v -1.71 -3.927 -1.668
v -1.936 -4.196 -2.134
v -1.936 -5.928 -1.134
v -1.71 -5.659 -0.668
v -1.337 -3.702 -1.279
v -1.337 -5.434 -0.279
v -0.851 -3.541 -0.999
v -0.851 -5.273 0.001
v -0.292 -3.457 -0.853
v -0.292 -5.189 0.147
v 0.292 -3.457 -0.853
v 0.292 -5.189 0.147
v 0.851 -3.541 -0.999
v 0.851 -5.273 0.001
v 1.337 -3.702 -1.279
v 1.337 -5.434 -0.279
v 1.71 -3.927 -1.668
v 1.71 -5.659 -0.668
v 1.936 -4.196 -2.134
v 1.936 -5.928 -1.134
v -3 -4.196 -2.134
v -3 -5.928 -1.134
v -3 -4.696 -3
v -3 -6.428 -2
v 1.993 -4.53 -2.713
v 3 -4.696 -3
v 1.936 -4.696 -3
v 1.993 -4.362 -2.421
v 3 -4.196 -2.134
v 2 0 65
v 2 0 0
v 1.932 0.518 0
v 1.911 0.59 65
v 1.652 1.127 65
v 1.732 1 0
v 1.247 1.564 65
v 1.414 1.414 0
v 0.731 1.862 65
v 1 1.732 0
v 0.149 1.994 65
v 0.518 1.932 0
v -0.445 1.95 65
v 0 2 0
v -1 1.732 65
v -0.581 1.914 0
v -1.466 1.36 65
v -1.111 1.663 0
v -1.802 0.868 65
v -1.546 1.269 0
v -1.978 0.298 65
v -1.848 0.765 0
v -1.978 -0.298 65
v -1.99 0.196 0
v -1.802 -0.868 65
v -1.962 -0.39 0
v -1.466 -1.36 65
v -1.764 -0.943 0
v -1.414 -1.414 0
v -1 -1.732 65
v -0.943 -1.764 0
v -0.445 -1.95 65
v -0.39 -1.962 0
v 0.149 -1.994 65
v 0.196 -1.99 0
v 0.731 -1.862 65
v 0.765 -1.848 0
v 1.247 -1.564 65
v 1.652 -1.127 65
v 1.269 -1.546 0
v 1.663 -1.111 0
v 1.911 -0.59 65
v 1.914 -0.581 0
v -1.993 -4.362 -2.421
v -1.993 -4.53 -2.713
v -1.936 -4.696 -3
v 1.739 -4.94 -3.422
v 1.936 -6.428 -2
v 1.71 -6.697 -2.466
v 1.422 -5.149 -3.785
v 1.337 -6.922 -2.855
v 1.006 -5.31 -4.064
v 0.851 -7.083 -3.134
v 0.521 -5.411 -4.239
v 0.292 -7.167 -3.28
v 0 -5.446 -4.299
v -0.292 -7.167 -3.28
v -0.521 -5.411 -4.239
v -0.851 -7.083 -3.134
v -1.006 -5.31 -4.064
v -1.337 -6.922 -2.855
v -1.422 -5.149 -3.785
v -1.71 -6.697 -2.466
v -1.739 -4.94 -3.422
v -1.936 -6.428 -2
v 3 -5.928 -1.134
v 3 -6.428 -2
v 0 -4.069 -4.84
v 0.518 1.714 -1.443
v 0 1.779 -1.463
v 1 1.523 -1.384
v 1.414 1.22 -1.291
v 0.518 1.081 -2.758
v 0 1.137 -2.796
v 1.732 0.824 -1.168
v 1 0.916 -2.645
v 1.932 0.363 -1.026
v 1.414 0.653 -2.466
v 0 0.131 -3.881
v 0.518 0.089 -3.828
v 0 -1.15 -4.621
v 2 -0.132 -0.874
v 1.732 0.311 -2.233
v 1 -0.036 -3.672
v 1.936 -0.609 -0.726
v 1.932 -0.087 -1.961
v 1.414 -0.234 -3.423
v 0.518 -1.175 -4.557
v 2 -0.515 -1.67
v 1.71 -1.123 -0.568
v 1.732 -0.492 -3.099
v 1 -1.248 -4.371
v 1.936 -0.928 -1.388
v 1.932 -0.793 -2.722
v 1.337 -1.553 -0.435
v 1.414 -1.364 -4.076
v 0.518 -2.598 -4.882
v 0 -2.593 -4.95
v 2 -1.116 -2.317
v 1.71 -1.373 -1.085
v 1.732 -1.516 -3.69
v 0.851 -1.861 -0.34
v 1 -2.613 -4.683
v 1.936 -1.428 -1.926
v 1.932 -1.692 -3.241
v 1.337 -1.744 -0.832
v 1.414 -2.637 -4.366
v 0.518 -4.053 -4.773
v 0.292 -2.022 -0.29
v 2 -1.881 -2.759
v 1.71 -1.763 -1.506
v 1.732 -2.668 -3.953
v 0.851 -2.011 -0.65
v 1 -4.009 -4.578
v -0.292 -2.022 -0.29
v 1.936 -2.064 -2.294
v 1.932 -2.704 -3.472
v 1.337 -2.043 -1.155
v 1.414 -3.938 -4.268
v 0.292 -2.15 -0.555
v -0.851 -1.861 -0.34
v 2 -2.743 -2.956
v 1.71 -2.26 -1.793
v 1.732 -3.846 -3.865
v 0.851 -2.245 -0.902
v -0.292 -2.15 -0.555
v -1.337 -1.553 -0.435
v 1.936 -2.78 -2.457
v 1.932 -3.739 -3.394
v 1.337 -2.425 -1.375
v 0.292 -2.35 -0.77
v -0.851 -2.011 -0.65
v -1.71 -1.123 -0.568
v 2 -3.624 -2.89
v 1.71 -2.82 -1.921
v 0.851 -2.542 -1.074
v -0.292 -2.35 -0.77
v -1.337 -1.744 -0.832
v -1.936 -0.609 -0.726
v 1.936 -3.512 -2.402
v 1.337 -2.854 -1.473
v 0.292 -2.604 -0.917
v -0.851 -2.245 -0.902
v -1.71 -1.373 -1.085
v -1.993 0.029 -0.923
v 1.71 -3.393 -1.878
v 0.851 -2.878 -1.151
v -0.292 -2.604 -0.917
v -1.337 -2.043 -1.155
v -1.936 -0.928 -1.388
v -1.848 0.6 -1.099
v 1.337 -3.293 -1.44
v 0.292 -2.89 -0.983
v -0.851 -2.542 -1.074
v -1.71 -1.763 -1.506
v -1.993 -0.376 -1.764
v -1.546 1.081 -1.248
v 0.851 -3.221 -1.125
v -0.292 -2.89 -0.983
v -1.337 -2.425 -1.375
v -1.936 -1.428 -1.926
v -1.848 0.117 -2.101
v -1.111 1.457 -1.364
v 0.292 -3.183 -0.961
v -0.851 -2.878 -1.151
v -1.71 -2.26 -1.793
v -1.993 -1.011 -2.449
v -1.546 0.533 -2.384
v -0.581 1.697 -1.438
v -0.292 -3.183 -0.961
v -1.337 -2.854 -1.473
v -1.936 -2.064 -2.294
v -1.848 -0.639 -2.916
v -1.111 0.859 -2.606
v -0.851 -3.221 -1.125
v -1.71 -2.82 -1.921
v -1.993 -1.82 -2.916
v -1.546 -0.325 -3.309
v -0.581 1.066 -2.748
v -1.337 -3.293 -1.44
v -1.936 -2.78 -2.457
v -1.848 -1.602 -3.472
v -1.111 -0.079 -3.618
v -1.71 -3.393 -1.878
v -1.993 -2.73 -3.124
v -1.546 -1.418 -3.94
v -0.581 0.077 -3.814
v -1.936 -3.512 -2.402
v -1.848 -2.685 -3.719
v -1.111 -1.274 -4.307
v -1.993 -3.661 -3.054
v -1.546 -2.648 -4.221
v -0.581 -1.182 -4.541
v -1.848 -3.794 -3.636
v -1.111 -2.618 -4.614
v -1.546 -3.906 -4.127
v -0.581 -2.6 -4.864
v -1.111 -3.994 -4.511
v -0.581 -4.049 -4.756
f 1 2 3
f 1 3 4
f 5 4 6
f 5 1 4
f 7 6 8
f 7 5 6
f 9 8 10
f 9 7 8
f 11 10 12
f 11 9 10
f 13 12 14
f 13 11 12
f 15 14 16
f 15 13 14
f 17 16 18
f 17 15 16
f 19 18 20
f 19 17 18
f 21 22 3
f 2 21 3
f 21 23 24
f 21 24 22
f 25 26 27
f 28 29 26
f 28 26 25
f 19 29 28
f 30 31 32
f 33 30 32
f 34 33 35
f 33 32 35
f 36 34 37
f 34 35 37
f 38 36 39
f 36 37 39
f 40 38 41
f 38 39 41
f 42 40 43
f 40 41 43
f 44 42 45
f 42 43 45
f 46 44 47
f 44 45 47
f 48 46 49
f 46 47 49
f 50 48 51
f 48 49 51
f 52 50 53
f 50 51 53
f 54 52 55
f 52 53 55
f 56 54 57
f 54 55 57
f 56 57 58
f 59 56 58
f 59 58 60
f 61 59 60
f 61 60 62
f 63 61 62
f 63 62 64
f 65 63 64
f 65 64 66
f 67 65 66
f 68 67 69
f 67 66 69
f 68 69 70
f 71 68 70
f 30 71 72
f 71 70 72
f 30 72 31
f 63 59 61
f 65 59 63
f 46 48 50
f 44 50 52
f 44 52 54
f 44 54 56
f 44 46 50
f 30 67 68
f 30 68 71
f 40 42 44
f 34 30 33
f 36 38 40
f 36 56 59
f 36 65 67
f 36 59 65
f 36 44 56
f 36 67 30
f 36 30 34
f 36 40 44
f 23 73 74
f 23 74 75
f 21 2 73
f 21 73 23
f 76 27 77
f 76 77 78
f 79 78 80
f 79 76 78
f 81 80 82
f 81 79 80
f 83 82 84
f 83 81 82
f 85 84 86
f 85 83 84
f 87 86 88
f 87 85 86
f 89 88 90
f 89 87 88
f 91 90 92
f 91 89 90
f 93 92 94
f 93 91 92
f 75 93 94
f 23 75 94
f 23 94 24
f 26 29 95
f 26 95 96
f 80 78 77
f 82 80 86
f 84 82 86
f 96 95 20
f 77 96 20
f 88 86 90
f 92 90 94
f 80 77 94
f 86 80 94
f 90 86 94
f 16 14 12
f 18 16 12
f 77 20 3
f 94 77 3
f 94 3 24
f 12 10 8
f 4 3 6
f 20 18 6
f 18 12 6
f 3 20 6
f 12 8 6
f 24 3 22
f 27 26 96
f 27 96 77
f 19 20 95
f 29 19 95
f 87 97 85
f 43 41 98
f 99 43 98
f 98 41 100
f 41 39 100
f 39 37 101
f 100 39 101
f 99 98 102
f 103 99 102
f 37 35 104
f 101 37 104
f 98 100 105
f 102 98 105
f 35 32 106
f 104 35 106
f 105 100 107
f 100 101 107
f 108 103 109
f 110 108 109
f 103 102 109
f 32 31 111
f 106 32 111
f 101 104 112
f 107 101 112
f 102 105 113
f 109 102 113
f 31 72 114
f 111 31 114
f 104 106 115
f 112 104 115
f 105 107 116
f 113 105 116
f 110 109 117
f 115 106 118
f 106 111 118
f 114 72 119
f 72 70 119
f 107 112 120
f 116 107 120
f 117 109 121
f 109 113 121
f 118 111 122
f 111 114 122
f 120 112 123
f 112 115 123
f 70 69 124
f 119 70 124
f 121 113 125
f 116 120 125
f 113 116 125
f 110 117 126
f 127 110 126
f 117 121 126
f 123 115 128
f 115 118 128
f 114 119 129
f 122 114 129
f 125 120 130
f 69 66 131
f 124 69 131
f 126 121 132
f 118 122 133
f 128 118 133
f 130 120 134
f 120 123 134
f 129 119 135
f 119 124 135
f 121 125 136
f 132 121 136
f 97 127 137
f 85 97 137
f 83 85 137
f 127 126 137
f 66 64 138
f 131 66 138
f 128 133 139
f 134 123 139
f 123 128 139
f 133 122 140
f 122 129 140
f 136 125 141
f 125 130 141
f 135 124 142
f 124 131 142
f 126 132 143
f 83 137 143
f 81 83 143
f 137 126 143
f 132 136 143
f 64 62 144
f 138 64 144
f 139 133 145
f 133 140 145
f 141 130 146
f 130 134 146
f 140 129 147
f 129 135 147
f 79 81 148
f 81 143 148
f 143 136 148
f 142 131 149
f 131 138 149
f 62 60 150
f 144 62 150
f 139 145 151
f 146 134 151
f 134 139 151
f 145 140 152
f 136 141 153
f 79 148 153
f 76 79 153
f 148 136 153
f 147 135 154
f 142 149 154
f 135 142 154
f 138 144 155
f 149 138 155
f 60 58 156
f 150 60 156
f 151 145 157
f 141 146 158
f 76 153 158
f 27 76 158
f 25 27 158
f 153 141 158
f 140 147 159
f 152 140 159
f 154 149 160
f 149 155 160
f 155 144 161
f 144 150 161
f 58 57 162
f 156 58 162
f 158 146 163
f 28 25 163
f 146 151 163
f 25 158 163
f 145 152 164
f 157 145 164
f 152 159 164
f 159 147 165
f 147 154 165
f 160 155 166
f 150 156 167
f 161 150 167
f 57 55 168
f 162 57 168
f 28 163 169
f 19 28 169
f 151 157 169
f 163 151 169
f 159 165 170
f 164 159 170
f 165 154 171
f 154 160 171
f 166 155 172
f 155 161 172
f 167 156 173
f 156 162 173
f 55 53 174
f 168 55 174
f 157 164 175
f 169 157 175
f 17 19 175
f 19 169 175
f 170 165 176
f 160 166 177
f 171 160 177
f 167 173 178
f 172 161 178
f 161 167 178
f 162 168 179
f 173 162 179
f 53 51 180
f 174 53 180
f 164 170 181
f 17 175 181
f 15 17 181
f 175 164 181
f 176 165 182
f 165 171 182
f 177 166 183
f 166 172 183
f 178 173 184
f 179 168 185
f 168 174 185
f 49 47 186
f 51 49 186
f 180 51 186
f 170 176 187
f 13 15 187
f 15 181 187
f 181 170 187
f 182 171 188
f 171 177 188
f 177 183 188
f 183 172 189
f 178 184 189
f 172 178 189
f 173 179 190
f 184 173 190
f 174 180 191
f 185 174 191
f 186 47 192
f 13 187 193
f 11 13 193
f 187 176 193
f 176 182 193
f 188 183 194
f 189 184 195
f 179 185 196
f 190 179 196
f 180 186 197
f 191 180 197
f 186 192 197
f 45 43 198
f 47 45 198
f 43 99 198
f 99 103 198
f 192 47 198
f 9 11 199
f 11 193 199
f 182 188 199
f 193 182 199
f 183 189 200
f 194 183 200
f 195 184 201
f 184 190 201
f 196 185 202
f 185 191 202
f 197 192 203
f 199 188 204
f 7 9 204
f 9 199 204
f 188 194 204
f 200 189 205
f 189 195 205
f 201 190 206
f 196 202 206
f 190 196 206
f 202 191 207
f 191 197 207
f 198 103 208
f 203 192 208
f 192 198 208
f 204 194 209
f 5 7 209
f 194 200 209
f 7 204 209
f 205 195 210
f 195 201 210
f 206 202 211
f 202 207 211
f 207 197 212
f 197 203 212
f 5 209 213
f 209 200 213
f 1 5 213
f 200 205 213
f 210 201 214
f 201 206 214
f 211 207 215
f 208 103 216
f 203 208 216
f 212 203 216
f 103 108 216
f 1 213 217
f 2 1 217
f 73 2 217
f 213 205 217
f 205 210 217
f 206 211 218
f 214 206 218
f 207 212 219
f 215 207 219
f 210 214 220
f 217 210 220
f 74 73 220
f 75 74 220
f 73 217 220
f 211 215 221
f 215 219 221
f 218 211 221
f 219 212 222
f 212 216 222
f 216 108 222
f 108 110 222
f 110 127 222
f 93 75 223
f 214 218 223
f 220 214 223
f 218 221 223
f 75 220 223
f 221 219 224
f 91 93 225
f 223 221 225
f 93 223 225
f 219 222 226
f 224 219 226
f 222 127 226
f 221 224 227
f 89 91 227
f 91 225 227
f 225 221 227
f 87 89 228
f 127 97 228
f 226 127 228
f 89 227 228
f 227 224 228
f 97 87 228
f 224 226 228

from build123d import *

# Parameters (mm, degrees)
SKETCH1_R           = 2
BOSS_EXTRUDE1_DEPTH = 65
SKETCH8_R           = 2
REVOLVE4_ANGLE      = 120
BOSS_EXTRUDE3_DEPTH = 2


with BuildPart() as part:
    # Sketch1 → Boss-Extrude1 (new body)
    with BuildSketch(Plane.XY):
        Circle(SKETCH1_R)
    extrude(amount=BOSS_EXTRUDE1_DEPTH)

    # Sketch8 → Revolve4 (revolve)
    with BuildSketch(Plane(origin=(0, 0, 0), x_dir=(-1, 0, 0), z_dir=(0, 0, -1))):
        with Locations(Location((0, 0, 0), (0, 0, 90))):
            Circle(SKETCH8_R)
    revolve(axis=Axis((0, -2.964026972, 0), (-1, 0, 0)), revolution_arc=REVOLVE4_ANGLE)

    # Sketch12 → Boss-Extrude3 (add)
    with BuildSketch(Plane(origin=(0, -2.223020229, 1.283461328), x_dir=(1, 0, 0), z_dir=(0, -0.8660254037844362, 0.5000000000000042))):
        with BuildLine():
            Line((2, -4.946040459), (1.936491673, -4.946040459))
            ThreePointArc((1.936491673, -4.946040459), (0, -6.446040459), (-1.936491673, -4.946040459))
            Line((-1.936491673, -4.946040459), (-2, -4.946040459))
            Line((-2, -4.946040459), (-3, -4.946040459))
            Line((-3, -4.946040459), (-3, -3.946040459))
            Line((-3, -3.946040459), (-2, -3.946040459))
            Line((-2, -3.946040459), (-1.936491673, -3.946040459))
            ThreePointArc((-1.936491673, -3.946040459), (0, -2.446040459), (1.936491673, -3.946040459))
            Line((1.936491673, -3.946040459), (2, -3.946040459))
            Line((2, -3.946040459), (3, -3.946040459))
            Line((3, -3.946040459), (3, -4.946040459))
            Line((3, -4.946040459), (2, -4.946040459))
        make_face()
    extrude(amount=BOSS_EXTRUDE3_DEPTH)


solid = part.part
